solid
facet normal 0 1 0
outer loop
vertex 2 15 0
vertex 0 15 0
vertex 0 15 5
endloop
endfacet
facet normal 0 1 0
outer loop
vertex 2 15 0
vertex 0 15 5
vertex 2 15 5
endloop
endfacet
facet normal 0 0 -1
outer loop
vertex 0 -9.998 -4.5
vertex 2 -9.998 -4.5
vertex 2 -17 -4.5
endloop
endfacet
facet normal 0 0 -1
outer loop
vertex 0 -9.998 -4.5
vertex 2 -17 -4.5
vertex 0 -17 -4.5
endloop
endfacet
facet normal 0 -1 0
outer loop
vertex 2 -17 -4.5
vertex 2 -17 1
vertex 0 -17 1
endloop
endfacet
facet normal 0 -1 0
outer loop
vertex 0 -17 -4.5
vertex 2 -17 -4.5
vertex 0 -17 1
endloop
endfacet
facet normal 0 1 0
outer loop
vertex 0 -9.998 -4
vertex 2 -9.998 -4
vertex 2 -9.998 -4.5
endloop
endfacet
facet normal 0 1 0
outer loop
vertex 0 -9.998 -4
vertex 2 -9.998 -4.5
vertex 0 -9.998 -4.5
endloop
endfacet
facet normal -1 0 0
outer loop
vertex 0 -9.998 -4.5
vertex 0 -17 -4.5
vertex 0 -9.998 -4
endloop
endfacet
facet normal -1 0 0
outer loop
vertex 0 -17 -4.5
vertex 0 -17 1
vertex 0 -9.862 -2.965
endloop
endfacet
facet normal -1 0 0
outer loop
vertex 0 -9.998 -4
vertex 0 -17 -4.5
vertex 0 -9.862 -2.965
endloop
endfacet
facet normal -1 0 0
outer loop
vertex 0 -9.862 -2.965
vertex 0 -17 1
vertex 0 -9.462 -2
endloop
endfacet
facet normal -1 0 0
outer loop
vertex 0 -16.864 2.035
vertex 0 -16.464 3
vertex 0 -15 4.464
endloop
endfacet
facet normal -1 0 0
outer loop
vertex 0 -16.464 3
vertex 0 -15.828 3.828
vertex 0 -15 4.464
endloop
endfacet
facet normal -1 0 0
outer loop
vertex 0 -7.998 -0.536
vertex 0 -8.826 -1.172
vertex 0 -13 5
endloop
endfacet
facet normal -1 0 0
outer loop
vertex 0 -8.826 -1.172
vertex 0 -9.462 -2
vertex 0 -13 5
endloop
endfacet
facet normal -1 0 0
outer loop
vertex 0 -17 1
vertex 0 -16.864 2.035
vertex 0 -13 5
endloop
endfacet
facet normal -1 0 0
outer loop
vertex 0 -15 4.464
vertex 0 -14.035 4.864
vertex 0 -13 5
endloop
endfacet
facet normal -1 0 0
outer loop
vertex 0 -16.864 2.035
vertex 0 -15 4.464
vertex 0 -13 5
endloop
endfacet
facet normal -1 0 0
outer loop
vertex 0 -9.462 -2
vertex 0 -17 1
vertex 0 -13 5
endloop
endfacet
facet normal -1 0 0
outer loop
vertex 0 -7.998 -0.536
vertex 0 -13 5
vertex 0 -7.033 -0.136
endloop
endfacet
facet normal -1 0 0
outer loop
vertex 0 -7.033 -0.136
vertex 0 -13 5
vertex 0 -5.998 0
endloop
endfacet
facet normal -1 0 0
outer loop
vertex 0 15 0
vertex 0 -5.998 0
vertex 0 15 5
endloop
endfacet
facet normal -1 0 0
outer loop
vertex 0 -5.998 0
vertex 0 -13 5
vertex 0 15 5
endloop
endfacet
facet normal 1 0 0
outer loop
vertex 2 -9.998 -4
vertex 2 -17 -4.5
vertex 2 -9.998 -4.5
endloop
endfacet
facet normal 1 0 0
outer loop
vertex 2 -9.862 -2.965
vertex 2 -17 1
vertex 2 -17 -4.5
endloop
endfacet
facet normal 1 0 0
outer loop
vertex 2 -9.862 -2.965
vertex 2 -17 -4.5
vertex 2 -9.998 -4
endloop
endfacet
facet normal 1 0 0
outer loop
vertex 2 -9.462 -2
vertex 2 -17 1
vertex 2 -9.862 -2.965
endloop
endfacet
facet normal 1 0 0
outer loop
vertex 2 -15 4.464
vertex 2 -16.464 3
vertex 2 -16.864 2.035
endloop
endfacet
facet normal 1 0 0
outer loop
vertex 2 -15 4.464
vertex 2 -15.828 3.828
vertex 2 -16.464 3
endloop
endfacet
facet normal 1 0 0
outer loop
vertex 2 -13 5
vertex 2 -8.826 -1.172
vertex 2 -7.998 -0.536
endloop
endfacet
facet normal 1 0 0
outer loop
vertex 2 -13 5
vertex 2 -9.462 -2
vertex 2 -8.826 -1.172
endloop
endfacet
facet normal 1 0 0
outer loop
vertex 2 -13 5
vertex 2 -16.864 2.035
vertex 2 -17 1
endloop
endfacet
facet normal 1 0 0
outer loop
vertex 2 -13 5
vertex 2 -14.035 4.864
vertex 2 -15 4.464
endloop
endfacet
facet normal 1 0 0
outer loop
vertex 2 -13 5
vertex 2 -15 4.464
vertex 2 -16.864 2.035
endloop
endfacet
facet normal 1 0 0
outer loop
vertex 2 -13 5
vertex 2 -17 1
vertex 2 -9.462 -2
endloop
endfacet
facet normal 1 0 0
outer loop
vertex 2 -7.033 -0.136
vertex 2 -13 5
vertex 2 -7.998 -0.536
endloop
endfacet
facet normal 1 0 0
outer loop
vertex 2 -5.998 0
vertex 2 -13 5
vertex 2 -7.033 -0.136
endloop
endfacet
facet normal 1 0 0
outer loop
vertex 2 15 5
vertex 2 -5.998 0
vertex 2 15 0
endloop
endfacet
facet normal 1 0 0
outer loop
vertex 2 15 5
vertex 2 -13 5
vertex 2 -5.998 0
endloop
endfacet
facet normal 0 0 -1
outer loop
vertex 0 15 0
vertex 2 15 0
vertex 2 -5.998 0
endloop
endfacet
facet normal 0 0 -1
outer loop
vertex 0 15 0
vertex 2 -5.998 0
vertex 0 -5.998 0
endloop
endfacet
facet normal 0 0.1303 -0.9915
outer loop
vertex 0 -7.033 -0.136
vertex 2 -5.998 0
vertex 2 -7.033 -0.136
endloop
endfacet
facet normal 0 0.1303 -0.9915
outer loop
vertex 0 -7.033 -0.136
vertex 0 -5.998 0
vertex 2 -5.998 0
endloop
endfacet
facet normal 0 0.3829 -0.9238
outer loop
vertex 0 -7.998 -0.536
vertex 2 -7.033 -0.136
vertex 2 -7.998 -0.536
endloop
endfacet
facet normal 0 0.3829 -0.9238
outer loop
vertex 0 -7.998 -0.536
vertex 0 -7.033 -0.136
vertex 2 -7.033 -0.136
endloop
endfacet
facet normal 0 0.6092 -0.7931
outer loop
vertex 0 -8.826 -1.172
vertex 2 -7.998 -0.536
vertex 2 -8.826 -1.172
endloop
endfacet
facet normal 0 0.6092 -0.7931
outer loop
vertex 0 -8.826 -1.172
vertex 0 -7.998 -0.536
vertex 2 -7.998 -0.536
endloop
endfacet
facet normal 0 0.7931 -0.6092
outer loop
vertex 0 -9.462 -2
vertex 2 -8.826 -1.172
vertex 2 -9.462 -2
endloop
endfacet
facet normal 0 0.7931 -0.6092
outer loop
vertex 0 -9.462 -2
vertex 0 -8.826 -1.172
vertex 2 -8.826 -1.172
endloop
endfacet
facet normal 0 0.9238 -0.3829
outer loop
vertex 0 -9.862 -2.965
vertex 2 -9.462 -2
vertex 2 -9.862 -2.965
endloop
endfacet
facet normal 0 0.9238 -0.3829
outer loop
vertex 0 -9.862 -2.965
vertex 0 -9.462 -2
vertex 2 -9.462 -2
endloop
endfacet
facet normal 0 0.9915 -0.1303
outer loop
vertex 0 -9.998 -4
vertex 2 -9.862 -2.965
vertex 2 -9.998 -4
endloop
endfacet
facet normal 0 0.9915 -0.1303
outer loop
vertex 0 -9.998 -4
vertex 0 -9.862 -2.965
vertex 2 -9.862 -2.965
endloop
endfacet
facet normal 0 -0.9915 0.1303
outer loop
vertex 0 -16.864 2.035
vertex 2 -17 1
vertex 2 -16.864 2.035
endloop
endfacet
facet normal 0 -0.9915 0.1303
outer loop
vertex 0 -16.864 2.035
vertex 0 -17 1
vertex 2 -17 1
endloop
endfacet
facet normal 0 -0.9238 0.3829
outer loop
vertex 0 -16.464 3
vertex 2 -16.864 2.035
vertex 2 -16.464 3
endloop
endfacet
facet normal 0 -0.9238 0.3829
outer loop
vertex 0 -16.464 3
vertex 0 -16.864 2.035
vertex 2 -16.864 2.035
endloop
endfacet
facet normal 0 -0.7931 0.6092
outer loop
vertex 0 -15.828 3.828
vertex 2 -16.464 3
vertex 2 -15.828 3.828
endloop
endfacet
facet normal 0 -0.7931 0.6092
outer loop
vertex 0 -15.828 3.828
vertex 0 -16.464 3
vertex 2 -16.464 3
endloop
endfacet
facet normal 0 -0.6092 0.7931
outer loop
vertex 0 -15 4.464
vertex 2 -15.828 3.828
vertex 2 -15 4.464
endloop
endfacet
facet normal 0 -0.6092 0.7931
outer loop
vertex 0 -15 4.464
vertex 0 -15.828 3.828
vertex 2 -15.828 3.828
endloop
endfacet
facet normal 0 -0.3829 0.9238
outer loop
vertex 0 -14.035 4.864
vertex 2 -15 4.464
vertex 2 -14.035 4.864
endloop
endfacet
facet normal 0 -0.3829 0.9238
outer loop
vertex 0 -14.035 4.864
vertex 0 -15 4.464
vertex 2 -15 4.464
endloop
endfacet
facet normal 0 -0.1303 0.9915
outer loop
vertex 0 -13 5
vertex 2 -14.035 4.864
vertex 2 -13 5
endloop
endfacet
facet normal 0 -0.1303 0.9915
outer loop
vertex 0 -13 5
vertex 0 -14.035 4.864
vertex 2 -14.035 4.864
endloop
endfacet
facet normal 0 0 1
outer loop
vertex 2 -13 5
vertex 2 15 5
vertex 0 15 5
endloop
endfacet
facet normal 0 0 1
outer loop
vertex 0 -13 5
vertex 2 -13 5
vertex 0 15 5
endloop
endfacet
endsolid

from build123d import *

# Parameters (mm, degrees)
BOSS_EXTRUDE1_DEPTH = 5
SKETCH2_W           = 2
SKETCH2_H           = 7.001972448
BOSS_EXTRUDE2_DEPTH = 4.5
FILLET1_R           = 4


with BuildPart() as part:
    # Sketch1 → Boss-Extrude1 (new body)
    with BuildSketch(Plane.XY):
        Polygon((0, 0), (0, 15), (2, 15), (2, 4.971605765), (2, -17), (0, -17), align=None)
    extrude(amount=BOSS_EXTRUDE1_DEPTH)

    # Sketch2 → Boss-Extrude2 (add)
    with BuildSketch(Plane(origin=(0, 0, 0), x_dir=(-1, 0, 0), z_dir=(0, 0, -1))):
        with Locations((-1, -13.499013776)):
            Rectangle(SKETCH2_W, SKETCH2_H)
    extrude(amount=BOSS_EXTRUDE2_DEPTH)

    # Fillet1
    fillet1_edges = [part.edges().sort_by_distance(p)[0] for p in [
        (1, -9.998027552, 0),
        (1, -17, 5),
    ]]
    fillet(fillet1_edges, radius=FILLET1_R)


solid = part.part
